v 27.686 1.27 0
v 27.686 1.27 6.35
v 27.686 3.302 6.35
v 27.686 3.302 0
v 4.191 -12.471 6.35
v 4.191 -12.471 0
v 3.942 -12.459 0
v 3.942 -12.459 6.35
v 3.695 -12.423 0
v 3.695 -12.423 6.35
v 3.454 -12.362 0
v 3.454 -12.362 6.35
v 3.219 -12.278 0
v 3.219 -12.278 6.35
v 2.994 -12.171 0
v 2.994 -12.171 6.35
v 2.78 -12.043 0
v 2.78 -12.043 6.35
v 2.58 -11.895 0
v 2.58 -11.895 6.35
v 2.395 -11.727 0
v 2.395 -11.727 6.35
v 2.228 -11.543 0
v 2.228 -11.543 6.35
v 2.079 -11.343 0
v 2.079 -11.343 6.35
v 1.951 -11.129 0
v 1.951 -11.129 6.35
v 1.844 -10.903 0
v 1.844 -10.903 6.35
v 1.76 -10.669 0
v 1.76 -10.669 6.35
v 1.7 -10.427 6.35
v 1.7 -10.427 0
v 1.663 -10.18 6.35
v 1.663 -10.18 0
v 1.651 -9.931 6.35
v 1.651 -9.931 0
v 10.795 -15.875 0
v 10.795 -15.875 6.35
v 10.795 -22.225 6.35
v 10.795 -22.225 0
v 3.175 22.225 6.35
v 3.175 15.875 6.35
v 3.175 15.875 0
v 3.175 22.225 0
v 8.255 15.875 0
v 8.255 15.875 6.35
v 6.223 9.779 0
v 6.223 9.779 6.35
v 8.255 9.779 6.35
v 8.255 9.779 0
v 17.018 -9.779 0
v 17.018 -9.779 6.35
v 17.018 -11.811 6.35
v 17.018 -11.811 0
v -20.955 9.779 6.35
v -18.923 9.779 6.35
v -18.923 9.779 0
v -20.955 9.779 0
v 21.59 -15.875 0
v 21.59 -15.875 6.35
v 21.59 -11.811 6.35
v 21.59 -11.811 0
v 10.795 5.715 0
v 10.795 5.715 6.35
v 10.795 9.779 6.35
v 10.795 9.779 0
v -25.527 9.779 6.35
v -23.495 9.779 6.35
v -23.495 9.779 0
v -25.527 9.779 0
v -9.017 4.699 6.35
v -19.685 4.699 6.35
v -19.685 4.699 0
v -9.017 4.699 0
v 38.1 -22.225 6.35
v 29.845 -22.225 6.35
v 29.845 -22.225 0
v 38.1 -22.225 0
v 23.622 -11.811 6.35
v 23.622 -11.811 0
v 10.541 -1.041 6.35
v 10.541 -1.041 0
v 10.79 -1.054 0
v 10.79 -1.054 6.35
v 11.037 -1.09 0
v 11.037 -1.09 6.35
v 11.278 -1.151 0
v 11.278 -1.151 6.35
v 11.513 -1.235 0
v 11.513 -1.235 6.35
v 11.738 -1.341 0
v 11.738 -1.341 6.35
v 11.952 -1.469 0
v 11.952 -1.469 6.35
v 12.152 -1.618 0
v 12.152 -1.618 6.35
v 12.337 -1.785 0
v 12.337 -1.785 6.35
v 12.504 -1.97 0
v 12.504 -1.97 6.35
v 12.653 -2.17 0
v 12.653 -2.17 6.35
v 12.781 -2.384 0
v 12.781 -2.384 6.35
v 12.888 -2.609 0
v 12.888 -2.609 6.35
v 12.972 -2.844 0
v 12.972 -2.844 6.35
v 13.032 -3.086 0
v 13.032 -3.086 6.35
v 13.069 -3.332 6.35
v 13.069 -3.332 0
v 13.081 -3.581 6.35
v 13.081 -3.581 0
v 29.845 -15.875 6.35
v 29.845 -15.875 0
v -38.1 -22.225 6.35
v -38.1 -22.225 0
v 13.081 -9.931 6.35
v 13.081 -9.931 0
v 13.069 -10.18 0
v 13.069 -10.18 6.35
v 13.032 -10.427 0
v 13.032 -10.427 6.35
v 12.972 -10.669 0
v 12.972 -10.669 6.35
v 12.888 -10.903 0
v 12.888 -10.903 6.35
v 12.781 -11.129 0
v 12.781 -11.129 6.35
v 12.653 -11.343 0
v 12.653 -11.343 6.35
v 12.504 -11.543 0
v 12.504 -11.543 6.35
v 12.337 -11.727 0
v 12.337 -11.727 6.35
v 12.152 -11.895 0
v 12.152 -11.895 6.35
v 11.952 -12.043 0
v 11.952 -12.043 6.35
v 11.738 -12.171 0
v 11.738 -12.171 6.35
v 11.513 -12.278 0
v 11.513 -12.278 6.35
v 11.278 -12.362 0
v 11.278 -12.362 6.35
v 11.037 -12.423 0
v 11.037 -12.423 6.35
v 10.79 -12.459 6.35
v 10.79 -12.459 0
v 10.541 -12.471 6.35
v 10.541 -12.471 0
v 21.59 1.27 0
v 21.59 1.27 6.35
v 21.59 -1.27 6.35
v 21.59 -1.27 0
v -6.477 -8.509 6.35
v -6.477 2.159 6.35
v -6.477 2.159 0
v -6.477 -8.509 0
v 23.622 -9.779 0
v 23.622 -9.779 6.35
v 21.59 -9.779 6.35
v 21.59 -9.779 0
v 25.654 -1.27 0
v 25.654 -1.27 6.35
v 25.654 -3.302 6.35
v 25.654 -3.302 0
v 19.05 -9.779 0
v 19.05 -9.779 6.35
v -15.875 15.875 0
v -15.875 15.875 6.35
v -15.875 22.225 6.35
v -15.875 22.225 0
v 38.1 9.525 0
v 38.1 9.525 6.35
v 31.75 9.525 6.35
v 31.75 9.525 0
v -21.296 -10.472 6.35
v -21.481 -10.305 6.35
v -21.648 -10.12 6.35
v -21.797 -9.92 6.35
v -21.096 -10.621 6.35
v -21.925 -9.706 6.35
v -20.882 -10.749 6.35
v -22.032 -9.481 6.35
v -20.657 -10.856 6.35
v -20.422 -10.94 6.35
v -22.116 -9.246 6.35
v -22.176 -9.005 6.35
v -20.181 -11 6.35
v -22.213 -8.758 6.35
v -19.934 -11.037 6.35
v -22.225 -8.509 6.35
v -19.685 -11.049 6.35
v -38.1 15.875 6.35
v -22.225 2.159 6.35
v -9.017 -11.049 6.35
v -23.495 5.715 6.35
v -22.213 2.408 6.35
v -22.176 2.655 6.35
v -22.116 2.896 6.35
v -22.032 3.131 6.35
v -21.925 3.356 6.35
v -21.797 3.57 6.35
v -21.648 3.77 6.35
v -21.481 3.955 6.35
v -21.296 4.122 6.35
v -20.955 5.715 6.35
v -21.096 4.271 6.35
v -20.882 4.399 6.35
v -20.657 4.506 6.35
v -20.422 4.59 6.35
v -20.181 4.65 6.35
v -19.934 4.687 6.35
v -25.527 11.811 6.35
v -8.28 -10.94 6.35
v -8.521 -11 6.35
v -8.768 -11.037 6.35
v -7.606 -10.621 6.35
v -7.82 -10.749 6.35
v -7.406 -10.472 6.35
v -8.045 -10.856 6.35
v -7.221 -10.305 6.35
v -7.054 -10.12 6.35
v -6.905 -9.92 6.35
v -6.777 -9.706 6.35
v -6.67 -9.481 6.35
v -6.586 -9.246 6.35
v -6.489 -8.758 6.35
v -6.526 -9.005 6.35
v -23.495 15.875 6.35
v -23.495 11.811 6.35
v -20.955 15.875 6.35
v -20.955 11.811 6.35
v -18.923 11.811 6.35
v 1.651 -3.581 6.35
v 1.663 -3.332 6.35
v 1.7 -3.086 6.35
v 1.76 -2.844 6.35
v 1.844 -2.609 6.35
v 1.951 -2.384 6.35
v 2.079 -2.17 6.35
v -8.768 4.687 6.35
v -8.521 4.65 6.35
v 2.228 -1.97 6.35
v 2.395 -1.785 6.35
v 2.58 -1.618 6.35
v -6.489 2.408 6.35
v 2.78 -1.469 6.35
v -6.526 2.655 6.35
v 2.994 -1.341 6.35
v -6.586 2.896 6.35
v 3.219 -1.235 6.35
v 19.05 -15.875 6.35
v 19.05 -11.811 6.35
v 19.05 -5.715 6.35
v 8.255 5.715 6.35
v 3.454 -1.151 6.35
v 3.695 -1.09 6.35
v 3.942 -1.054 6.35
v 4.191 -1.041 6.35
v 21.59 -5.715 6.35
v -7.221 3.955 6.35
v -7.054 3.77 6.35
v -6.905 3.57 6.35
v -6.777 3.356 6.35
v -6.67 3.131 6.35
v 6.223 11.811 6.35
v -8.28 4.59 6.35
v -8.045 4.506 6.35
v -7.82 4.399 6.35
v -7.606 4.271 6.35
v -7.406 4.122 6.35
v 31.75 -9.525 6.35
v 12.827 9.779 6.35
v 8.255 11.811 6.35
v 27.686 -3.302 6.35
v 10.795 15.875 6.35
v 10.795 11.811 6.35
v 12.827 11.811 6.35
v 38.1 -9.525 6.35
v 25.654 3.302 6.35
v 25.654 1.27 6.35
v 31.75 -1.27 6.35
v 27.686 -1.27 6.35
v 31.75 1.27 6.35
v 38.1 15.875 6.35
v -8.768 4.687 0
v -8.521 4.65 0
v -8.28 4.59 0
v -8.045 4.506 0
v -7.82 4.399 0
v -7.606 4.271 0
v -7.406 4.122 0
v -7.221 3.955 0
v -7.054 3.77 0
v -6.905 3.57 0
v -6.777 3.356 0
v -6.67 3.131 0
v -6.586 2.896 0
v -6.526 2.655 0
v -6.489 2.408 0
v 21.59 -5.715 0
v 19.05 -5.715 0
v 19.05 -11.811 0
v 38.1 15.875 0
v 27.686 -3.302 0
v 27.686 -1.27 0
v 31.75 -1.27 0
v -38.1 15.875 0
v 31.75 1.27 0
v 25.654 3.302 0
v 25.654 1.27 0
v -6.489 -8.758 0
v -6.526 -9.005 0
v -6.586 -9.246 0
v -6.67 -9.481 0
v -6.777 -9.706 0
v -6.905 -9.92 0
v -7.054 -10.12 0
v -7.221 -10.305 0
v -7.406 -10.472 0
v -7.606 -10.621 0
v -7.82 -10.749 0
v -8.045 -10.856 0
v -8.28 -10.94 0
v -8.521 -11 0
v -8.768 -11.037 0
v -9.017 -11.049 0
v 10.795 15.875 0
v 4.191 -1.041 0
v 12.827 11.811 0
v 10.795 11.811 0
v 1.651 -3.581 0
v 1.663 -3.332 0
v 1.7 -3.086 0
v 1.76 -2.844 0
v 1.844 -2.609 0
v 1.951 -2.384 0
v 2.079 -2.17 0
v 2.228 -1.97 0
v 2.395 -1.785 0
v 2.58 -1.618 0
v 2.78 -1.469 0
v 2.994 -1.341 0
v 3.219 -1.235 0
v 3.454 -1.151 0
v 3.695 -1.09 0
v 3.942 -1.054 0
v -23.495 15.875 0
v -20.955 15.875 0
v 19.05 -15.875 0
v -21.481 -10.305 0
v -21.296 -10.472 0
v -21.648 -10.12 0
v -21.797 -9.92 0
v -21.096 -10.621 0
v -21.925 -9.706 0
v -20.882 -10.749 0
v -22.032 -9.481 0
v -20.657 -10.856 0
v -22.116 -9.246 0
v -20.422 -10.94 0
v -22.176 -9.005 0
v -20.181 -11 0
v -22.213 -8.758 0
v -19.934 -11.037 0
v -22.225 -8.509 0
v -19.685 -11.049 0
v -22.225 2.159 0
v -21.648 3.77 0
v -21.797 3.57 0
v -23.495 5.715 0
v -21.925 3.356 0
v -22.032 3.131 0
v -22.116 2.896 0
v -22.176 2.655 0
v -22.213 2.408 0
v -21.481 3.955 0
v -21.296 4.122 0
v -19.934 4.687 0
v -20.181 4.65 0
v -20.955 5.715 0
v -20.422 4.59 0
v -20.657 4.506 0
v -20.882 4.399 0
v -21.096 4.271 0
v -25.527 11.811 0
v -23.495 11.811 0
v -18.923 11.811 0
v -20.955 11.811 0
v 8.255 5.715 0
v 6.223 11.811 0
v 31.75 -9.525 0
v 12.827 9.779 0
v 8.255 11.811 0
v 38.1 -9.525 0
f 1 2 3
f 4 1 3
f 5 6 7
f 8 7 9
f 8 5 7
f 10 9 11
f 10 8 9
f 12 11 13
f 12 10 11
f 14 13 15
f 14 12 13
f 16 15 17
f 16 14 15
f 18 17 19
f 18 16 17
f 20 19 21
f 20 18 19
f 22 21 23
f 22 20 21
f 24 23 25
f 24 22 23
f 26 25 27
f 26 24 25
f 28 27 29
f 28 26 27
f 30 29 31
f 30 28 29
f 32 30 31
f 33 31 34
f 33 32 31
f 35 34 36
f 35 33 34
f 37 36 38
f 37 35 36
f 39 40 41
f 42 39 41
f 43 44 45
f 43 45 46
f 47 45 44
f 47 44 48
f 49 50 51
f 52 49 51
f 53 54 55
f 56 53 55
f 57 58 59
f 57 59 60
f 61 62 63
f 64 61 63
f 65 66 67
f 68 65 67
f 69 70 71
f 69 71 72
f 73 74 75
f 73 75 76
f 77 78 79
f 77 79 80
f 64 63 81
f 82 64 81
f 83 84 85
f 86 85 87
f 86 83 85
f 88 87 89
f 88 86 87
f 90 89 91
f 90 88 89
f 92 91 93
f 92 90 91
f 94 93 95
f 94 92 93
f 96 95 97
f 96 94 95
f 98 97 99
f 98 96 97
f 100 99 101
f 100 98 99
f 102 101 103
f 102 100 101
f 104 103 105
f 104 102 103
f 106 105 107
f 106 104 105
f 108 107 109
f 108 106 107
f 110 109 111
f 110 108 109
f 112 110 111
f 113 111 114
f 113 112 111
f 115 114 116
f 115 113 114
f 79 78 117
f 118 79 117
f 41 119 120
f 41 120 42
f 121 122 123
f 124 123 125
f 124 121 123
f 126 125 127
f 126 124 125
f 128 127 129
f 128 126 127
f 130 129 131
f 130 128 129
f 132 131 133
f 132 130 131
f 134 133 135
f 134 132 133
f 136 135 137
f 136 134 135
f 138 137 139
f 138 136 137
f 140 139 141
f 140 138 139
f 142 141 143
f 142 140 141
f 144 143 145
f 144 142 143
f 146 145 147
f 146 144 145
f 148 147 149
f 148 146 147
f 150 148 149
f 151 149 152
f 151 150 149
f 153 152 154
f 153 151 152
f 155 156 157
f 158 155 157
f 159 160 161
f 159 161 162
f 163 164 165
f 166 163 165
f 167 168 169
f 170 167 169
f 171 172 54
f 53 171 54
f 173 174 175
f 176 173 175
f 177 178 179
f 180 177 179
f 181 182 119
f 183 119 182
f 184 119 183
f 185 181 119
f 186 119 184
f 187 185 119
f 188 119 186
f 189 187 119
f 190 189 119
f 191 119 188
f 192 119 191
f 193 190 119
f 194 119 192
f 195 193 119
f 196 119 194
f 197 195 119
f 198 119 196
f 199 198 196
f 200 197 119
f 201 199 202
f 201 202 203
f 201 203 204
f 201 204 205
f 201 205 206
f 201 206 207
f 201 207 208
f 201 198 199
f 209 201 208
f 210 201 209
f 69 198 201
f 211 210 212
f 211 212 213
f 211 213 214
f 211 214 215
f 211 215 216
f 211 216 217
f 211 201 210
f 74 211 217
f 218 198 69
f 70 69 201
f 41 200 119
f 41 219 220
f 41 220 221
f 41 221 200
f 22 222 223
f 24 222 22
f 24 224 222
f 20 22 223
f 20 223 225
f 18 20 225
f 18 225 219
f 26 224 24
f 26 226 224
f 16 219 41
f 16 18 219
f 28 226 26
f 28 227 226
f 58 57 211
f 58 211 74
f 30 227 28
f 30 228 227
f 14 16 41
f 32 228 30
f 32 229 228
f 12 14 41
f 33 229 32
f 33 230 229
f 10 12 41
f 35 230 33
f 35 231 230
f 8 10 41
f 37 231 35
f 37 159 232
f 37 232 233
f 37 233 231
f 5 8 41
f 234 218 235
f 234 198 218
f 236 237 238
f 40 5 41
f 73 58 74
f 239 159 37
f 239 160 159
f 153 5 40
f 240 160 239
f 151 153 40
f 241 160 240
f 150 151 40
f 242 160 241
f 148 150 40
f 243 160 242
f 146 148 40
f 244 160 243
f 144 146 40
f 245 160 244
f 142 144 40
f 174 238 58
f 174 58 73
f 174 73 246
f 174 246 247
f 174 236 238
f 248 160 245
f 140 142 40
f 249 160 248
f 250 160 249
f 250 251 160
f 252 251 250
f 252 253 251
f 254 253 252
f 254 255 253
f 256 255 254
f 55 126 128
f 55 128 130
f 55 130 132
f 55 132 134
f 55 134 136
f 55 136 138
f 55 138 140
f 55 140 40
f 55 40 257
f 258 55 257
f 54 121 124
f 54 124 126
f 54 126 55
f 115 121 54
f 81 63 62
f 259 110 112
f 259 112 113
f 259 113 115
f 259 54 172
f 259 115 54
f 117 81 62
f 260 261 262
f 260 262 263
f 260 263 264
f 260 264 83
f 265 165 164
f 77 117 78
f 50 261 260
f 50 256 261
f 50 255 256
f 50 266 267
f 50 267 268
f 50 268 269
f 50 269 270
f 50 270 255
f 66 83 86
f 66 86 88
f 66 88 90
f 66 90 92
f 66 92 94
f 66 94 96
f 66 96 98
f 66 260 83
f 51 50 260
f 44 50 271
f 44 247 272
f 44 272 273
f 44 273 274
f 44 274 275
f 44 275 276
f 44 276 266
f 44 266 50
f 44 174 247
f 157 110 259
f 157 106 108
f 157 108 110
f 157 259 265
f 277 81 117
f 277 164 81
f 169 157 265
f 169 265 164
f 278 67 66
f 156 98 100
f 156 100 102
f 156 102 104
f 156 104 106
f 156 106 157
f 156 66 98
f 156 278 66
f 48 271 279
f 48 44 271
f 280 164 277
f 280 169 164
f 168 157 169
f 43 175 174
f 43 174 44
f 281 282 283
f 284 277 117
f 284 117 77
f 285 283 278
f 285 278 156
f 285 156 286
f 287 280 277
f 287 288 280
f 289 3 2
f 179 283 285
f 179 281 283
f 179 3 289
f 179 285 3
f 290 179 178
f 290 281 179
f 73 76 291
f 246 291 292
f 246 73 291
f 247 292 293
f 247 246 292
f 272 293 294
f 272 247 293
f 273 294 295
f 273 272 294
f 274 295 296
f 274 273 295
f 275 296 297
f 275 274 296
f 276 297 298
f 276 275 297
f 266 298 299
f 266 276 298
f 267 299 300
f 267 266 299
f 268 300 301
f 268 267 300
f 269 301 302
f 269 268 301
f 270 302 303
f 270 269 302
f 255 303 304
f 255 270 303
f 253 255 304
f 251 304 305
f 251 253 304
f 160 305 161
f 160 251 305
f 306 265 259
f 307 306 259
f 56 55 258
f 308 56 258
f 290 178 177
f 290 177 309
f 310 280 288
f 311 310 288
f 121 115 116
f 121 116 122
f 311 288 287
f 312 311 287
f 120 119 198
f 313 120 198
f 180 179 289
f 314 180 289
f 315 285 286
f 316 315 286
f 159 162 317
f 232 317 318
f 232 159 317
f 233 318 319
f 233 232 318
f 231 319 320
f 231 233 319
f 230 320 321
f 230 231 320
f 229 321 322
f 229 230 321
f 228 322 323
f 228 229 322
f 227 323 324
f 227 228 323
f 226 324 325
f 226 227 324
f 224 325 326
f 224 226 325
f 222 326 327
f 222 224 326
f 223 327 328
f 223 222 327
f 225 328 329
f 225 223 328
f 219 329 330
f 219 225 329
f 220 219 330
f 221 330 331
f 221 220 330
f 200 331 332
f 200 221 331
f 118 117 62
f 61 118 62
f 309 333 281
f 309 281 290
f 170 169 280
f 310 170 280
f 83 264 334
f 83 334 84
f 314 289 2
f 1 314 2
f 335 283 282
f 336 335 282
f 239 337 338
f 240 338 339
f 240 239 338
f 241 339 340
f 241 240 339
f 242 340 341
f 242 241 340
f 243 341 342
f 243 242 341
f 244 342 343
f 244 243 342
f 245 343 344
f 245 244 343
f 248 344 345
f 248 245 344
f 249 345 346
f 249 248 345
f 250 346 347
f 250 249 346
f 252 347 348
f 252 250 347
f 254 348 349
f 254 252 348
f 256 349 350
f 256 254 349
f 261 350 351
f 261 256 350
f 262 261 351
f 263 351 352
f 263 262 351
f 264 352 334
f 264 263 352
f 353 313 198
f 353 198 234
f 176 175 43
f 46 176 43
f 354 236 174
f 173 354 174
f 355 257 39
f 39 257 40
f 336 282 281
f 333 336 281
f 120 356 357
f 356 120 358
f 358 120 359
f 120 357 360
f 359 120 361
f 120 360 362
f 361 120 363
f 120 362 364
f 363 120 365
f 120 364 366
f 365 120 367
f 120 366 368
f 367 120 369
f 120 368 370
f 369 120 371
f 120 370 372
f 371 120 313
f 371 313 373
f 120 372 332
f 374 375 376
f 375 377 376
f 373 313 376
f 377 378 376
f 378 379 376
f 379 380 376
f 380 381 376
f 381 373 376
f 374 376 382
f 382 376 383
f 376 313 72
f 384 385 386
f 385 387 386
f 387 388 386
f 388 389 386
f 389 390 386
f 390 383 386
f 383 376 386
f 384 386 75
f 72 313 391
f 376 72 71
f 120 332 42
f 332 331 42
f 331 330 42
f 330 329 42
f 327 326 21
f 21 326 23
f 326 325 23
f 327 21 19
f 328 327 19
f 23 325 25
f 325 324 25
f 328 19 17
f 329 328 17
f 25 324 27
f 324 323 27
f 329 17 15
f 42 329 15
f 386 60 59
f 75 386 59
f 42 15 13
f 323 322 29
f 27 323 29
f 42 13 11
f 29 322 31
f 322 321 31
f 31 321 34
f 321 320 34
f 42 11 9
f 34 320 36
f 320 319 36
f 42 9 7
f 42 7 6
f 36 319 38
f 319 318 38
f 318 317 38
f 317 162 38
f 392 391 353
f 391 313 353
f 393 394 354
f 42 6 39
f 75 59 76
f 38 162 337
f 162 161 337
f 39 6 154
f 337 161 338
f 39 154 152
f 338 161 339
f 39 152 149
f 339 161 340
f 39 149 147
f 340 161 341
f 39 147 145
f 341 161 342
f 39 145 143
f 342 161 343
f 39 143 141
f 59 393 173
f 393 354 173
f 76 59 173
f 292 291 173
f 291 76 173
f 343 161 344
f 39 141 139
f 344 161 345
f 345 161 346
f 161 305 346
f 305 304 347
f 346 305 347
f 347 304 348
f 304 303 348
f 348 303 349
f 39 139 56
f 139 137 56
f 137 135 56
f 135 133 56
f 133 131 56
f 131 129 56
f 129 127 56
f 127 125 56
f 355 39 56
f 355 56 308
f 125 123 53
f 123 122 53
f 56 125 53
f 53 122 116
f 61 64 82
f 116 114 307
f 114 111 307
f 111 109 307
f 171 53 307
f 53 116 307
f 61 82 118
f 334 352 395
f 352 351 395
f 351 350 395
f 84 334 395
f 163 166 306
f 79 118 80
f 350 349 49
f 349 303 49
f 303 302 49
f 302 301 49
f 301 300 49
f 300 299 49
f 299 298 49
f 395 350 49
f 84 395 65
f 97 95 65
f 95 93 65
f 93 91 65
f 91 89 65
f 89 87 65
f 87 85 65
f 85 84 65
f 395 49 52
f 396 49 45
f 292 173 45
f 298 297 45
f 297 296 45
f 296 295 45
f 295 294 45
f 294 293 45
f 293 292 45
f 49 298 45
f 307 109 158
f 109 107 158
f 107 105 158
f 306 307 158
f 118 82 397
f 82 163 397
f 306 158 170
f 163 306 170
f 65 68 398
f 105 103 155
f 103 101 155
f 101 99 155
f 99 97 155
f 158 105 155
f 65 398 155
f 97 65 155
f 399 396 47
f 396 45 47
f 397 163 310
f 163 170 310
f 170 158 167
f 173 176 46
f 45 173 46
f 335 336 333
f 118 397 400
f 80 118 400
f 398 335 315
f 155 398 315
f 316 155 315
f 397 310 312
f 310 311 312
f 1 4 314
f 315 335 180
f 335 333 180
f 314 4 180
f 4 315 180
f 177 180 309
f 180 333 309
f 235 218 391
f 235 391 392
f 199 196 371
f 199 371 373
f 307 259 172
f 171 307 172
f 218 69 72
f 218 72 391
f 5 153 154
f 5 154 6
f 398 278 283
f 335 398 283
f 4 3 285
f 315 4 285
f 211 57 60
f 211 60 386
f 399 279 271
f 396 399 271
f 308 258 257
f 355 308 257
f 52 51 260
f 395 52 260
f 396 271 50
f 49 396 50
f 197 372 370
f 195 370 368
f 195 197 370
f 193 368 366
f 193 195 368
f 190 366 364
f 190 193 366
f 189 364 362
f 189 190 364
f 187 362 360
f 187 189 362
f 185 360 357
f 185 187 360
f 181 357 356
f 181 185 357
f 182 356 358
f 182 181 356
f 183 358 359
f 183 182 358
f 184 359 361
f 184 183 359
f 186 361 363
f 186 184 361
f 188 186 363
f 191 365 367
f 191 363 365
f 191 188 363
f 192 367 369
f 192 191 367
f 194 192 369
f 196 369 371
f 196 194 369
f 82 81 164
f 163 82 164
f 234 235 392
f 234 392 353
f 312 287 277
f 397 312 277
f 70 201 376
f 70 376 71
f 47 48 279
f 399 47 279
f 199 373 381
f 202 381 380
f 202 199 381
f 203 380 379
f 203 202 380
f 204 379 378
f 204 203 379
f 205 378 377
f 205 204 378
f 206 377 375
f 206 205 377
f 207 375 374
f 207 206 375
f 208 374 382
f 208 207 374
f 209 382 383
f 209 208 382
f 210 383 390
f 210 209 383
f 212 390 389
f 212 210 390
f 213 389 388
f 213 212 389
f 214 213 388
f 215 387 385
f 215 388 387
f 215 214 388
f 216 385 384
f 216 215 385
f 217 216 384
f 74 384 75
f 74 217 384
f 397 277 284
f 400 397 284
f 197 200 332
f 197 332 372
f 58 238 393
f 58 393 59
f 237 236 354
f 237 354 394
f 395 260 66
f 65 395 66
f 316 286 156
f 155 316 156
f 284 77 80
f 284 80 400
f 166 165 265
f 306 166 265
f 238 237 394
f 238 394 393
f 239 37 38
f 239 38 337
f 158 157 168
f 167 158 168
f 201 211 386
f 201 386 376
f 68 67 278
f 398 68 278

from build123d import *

# Parameters (mm, degrees)
SKETCH1_W               = 76.2
SKETCH1_H               = 31.75
BOSS_EXTRUDE1_DEPTH     = 6.35
SKETCH2_W               = 19.05
SKETCH2_H               = 6.35
BOSS_EXTRUDE2_DEPTH     = 6.35
CUT_EXTRUDE1_DEPTH      = 6.35
CUT_EXTRUDE4_DEPTH      = 6.35
SKETCH5_W               = 76.2
SKETCH5_H               = 6.35
BOSS_EXTRUDE3_DEPTH     = 6.35
CUT_EXTRUDE7_DEPTH      = 1
CUT_EXTRUDE7_DEPTH_BACK = 7.35


with BuildPart() as part:
    # Sketch1 → Boss-Extrude1 (new body)
    with BuildSketch(Plane.XY):
        Rectangle(SKETCH1_W, SKETCH1_H)
    extrude(amount=BOSS_EXTRUDE1_DEPTH)

    # Sketch2 → Boss-Extrude2 (add)
    with BuildSketch(Plane.XY.offset(6.35)):
        with Locations((-6.35, 19.05)):
            Rectangle(SKETCH2_W, SKETCH2_H)
    extrude(amount=-BOSS_EXTRUDE2_DEPTH)

    # Sketch3 → Cut-Extrude1 (cut)
    with BuildSketch(Plane.XY.offset(6.35)):
        Polygon((-20.955, 11.811), (-18.923, 11.811), (-18.923, 9.779), (-20.955, 9.779), (-20.955, 5.715), (-23.495, 5.715), (-23.495, 9.779), (-25.527, 9.779), (-25.527, 11.811), (-23.495, 11.811), (-23.495, 15.875), (-20.955, 15.875), align=None)
        Polygon((8.255, 9.779), (8.255, 5.715), (10.795, 5.715), (10.795, 9.779), (12.827, 9.779), (12.827, 11.811), (10.795, 11.811), (10.795, 15.875), (8.255, 15.875), (8.255, 11.811), (6.223, 11.811), (6.223, 9.779), align=None)
    extrude(amount=-CUT_EXTRUDE1_DEPTH, mode=Mode.SUBTRACT)

    # Sketch4 → Cut-Extrude4 (cut)
    with BuildSketch(Plane.XY.offset(6.35)):
        Polygon((31.75, -9.525), (38.1, -9.525), (38.1, 9.525), (31.75, 9.525), (31.75, 1.27), (27.686, 1.27), (27.686, 3.302), (25.654, 3.302), (25.654, 1.27), (21.59, 1.27), (21.59, -1.27), (25.654, -1.27), (25.654, -3.302), (27.686, -3.302), (27.686, -1.27), (31.75, -1.27), align=None)
    extrude(amount=-CUT_EXTRUDE4_DEPTH, mode=Mode.SUBTRACT)

    # Sketch5 → Boss-Extrude3 (add)
    with BuildSketch(Plane.XY.offset(6.35)):
        with Locations((0, -19.05)):
            Rectangle(SKETCH5_W, SKETCH5_H)
    extrude(amount=-BOSS_EXTRUDE3_DEPTH)

    # Sketch8 → Cut-Extrude7 (cut, two sides)
    with BuildSketch(Plane.XY.offset(6.35)) as cut_extrude7_sk:
        with BuildLine():
            Line((-19.685, 4.699), (-9.017, 4.699))
            ThreePointArc((-9.017, 4.699), (-7.220948776, 3.955051224), (-6.477, 2.159))
            Line((-6.477, 2.159), (-6.477, -8.509))
            ThreePointArc((-6.477, -8.509), (-7.220948776, -10.305051224), (-9.017, -11.049))
            Line((-9.017, -11.049), (-19.685, -11.049))
            ThreePointArc((-19.685, -11.049), (-21.481051224, -10.305051224), (-22.225, -8.509))
            Line((-22.225, -8.509), (-22.225, 2.159))
            ThreePointArc((-22.225, 2.159), (-21.481051224, 3.955051224), (-19.685, 4.699))
        make_face()
        Polygon((10.795, -15.875), (10.795, -22.225), (29.845, -22.225), (29.845, -15.875), (21.59, -15.875), (21.59, -11.811), (23.622, -11.811), (23.622, -9.779), (21.59, -9.779), (21.59, -5.715), (19.05, -5.715), (19.05, -9.779), (17.018, -9.779), (17.018, -11.811), (19.05, -11.811), (19.05, -15.875), align=None)
        with BuildLine():
            Line((4.191, -1.0414), (10.541, -1.0414))
            ThreePointArc((10.541, -1.0414), (12.337051224, -1.785348776), (13.081, -3.5814))
            Line((13.081, -3.5814), (13.081, -9.9314))
            ThreePointArc((13.081, -9.9314), (12.337051224, -11.727451224), (10.541, -12.4714))
            Line((10.541, -12.4714), (4.191, -12.4714))
            ThreePointArc((4.191, -12.4714), (2.394948776, -11.727451224), (1.651, -9.9314))
            Line((1.651, -9.9314), (1.651, -3.5814))
            ThreePointArc((1.651, -3.5814), (2.394948776, -1.785348776), (4.191, -1.0414))
        make_face()
    extrude(amount=CUT_EXTRUDE7_DEPTH, mode=Mode.SUBTRACT)
    extrude(cut_extrude7_sk.sketch, amount=-CUT_EXTRUDE7_DEPTH_BACK, mode=Mode.SUBTRACT)


solid = part.part
